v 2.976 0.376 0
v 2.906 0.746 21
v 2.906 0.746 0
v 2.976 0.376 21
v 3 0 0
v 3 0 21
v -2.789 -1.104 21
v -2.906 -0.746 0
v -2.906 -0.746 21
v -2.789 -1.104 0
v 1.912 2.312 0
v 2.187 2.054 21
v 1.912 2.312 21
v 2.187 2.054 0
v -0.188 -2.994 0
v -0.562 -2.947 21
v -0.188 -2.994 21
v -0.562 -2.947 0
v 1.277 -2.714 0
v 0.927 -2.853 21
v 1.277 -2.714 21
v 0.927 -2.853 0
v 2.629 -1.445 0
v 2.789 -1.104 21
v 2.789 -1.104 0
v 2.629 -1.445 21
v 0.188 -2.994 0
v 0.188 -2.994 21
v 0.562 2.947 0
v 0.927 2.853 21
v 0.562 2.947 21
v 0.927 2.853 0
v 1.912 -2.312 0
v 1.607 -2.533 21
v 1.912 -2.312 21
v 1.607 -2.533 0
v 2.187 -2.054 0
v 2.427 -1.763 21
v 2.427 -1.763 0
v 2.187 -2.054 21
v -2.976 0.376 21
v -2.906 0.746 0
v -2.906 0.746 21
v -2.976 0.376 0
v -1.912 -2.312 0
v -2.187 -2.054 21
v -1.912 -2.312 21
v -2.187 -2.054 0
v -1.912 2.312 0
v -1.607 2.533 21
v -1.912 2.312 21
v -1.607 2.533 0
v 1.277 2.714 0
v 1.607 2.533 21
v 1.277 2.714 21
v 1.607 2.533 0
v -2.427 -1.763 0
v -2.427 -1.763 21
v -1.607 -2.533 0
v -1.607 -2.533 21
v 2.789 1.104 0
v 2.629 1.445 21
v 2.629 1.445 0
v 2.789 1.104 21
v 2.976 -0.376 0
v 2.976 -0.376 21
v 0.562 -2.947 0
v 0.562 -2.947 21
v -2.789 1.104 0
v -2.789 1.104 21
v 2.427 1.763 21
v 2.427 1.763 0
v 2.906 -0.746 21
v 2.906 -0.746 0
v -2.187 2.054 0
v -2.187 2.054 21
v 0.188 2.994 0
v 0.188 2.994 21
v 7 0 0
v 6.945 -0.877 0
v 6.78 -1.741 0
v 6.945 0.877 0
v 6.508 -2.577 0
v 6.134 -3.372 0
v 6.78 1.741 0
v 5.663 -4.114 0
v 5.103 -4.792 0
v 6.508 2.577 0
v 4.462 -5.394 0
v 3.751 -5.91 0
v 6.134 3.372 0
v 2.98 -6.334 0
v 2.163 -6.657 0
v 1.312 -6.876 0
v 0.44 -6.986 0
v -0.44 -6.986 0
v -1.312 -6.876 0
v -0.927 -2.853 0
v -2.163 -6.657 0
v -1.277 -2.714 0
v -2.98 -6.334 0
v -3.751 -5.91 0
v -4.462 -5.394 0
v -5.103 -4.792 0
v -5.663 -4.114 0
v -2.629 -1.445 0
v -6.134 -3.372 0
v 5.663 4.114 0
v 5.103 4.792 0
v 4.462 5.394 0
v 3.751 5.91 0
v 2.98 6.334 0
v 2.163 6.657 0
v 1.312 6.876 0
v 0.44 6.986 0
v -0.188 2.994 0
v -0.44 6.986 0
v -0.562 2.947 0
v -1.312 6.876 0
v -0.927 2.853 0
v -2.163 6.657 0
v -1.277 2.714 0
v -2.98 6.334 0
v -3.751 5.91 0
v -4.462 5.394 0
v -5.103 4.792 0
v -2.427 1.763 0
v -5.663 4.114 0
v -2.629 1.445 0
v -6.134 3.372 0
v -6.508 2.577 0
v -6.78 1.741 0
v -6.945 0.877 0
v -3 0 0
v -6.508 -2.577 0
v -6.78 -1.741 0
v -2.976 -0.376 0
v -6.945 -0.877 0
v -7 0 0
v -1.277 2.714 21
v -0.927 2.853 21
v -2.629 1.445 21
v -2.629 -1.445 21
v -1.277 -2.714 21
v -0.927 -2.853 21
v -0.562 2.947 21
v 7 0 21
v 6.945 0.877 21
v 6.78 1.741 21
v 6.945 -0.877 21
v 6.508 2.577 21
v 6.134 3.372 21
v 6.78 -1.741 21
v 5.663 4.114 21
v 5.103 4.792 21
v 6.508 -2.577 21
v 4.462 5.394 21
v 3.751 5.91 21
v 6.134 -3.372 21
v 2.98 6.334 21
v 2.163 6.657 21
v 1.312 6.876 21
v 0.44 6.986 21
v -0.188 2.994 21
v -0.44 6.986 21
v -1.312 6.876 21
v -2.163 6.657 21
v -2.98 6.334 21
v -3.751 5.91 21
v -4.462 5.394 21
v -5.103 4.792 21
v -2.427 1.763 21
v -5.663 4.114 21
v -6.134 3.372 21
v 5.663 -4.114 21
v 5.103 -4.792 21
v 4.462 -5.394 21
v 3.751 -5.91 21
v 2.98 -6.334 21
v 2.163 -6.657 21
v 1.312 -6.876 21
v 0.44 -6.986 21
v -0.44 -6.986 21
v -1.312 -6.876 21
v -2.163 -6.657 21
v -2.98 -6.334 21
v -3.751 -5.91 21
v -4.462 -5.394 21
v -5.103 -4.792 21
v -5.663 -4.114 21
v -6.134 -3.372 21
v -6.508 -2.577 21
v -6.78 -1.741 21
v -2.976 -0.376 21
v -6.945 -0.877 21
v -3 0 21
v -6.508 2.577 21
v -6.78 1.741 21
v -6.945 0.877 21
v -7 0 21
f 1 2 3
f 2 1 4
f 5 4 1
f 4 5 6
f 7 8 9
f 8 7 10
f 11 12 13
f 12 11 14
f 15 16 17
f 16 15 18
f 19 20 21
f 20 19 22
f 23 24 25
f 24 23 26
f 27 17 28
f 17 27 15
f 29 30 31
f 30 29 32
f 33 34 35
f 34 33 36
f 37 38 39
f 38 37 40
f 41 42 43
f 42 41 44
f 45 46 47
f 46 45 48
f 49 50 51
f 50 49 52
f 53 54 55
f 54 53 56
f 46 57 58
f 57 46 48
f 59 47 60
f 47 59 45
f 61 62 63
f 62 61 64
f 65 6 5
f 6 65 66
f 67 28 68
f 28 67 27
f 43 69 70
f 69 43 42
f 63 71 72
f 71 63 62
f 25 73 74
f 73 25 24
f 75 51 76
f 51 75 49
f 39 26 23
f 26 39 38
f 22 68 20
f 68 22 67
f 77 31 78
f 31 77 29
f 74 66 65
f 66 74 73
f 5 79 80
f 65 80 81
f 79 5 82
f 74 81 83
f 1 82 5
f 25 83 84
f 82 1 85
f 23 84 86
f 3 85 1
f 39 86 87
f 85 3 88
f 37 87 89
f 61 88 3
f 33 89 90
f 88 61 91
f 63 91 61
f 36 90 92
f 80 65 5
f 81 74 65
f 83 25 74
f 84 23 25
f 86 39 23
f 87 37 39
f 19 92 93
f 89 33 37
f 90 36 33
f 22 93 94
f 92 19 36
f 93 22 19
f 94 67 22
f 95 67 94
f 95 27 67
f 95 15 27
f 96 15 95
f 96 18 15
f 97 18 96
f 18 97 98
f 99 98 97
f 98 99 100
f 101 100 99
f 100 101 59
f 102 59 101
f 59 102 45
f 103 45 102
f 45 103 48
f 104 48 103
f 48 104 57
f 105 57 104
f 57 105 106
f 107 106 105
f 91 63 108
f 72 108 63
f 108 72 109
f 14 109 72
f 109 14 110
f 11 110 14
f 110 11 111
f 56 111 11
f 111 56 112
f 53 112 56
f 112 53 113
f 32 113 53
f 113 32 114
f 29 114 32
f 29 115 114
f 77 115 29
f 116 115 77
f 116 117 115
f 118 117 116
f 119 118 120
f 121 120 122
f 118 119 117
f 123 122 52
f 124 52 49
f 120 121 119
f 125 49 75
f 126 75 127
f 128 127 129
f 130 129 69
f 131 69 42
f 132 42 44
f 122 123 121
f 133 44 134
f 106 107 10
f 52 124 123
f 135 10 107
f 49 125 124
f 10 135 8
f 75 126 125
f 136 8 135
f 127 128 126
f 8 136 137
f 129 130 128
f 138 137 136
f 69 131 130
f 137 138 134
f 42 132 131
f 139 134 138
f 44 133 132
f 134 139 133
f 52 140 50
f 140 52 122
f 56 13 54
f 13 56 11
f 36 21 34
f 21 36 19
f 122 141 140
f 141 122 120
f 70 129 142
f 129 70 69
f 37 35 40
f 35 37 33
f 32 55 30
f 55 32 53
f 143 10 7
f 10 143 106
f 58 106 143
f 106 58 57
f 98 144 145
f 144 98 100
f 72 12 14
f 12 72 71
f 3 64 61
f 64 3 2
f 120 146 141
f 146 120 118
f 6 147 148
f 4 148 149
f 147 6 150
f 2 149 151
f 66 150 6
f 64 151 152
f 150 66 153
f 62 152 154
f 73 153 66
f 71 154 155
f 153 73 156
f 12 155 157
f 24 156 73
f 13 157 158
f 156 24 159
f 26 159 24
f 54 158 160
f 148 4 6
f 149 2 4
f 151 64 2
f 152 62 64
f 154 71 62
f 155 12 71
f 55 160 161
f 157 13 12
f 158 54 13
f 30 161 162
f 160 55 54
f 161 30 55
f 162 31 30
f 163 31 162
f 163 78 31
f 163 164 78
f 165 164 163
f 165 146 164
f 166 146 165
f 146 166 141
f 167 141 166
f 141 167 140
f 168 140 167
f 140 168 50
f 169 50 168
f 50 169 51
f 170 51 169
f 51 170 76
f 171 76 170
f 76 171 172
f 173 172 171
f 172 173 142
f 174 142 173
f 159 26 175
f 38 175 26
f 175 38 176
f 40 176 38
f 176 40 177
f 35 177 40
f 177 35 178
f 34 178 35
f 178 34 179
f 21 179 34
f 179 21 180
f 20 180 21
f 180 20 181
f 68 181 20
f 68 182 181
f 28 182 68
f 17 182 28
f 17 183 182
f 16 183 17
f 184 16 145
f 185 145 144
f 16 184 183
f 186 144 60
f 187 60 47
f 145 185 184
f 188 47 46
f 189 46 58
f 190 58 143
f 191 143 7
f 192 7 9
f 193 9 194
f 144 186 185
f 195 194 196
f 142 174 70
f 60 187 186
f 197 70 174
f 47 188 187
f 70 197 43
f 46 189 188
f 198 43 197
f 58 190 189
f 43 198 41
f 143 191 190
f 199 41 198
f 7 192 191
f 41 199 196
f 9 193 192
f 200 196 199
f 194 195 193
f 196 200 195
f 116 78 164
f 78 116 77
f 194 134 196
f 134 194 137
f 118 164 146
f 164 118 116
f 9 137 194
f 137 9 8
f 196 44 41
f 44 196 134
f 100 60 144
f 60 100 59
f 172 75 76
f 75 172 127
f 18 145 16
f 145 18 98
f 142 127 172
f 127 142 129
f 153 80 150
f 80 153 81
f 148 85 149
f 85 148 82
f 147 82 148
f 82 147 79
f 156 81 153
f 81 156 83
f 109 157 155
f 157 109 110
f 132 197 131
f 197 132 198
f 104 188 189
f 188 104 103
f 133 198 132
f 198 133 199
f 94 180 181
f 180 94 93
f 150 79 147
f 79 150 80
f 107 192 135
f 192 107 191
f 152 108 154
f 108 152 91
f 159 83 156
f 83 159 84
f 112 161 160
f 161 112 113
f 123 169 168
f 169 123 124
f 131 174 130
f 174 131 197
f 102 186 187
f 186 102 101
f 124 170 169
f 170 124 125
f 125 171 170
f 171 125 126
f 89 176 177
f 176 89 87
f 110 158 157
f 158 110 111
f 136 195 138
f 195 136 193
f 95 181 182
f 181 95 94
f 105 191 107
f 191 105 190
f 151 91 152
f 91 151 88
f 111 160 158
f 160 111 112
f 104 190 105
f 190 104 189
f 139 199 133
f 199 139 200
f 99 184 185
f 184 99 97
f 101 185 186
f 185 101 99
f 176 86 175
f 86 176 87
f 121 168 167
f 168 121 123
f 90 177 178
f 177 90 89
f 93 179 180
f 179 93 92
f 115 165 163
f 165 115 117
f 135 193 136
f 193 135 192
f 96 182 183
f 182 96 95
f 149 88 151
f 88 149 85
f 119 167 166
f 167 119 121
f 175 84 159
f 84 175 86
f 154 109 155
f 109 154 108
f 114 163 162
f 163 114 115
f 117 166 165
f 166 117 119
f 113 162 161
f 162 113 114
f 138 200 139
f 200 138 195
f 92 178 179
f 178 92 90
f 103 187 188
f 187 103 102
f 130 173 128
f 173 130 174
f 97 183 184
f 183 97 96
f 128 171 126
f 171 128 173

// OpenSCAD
$fn = 50;


difference() {
	union() {
		cylinder(h = 21, r = 7.0000000000);
	}
	union() {
		cylinder(h = 21, r = 3.0000000000);
		cylinder(h = 21, r = 1.5000000000);
		cylinder(h = 21, r = 1.5000000000);
		cylinder(h = 21, r = 1.5000000000);
	}
}
